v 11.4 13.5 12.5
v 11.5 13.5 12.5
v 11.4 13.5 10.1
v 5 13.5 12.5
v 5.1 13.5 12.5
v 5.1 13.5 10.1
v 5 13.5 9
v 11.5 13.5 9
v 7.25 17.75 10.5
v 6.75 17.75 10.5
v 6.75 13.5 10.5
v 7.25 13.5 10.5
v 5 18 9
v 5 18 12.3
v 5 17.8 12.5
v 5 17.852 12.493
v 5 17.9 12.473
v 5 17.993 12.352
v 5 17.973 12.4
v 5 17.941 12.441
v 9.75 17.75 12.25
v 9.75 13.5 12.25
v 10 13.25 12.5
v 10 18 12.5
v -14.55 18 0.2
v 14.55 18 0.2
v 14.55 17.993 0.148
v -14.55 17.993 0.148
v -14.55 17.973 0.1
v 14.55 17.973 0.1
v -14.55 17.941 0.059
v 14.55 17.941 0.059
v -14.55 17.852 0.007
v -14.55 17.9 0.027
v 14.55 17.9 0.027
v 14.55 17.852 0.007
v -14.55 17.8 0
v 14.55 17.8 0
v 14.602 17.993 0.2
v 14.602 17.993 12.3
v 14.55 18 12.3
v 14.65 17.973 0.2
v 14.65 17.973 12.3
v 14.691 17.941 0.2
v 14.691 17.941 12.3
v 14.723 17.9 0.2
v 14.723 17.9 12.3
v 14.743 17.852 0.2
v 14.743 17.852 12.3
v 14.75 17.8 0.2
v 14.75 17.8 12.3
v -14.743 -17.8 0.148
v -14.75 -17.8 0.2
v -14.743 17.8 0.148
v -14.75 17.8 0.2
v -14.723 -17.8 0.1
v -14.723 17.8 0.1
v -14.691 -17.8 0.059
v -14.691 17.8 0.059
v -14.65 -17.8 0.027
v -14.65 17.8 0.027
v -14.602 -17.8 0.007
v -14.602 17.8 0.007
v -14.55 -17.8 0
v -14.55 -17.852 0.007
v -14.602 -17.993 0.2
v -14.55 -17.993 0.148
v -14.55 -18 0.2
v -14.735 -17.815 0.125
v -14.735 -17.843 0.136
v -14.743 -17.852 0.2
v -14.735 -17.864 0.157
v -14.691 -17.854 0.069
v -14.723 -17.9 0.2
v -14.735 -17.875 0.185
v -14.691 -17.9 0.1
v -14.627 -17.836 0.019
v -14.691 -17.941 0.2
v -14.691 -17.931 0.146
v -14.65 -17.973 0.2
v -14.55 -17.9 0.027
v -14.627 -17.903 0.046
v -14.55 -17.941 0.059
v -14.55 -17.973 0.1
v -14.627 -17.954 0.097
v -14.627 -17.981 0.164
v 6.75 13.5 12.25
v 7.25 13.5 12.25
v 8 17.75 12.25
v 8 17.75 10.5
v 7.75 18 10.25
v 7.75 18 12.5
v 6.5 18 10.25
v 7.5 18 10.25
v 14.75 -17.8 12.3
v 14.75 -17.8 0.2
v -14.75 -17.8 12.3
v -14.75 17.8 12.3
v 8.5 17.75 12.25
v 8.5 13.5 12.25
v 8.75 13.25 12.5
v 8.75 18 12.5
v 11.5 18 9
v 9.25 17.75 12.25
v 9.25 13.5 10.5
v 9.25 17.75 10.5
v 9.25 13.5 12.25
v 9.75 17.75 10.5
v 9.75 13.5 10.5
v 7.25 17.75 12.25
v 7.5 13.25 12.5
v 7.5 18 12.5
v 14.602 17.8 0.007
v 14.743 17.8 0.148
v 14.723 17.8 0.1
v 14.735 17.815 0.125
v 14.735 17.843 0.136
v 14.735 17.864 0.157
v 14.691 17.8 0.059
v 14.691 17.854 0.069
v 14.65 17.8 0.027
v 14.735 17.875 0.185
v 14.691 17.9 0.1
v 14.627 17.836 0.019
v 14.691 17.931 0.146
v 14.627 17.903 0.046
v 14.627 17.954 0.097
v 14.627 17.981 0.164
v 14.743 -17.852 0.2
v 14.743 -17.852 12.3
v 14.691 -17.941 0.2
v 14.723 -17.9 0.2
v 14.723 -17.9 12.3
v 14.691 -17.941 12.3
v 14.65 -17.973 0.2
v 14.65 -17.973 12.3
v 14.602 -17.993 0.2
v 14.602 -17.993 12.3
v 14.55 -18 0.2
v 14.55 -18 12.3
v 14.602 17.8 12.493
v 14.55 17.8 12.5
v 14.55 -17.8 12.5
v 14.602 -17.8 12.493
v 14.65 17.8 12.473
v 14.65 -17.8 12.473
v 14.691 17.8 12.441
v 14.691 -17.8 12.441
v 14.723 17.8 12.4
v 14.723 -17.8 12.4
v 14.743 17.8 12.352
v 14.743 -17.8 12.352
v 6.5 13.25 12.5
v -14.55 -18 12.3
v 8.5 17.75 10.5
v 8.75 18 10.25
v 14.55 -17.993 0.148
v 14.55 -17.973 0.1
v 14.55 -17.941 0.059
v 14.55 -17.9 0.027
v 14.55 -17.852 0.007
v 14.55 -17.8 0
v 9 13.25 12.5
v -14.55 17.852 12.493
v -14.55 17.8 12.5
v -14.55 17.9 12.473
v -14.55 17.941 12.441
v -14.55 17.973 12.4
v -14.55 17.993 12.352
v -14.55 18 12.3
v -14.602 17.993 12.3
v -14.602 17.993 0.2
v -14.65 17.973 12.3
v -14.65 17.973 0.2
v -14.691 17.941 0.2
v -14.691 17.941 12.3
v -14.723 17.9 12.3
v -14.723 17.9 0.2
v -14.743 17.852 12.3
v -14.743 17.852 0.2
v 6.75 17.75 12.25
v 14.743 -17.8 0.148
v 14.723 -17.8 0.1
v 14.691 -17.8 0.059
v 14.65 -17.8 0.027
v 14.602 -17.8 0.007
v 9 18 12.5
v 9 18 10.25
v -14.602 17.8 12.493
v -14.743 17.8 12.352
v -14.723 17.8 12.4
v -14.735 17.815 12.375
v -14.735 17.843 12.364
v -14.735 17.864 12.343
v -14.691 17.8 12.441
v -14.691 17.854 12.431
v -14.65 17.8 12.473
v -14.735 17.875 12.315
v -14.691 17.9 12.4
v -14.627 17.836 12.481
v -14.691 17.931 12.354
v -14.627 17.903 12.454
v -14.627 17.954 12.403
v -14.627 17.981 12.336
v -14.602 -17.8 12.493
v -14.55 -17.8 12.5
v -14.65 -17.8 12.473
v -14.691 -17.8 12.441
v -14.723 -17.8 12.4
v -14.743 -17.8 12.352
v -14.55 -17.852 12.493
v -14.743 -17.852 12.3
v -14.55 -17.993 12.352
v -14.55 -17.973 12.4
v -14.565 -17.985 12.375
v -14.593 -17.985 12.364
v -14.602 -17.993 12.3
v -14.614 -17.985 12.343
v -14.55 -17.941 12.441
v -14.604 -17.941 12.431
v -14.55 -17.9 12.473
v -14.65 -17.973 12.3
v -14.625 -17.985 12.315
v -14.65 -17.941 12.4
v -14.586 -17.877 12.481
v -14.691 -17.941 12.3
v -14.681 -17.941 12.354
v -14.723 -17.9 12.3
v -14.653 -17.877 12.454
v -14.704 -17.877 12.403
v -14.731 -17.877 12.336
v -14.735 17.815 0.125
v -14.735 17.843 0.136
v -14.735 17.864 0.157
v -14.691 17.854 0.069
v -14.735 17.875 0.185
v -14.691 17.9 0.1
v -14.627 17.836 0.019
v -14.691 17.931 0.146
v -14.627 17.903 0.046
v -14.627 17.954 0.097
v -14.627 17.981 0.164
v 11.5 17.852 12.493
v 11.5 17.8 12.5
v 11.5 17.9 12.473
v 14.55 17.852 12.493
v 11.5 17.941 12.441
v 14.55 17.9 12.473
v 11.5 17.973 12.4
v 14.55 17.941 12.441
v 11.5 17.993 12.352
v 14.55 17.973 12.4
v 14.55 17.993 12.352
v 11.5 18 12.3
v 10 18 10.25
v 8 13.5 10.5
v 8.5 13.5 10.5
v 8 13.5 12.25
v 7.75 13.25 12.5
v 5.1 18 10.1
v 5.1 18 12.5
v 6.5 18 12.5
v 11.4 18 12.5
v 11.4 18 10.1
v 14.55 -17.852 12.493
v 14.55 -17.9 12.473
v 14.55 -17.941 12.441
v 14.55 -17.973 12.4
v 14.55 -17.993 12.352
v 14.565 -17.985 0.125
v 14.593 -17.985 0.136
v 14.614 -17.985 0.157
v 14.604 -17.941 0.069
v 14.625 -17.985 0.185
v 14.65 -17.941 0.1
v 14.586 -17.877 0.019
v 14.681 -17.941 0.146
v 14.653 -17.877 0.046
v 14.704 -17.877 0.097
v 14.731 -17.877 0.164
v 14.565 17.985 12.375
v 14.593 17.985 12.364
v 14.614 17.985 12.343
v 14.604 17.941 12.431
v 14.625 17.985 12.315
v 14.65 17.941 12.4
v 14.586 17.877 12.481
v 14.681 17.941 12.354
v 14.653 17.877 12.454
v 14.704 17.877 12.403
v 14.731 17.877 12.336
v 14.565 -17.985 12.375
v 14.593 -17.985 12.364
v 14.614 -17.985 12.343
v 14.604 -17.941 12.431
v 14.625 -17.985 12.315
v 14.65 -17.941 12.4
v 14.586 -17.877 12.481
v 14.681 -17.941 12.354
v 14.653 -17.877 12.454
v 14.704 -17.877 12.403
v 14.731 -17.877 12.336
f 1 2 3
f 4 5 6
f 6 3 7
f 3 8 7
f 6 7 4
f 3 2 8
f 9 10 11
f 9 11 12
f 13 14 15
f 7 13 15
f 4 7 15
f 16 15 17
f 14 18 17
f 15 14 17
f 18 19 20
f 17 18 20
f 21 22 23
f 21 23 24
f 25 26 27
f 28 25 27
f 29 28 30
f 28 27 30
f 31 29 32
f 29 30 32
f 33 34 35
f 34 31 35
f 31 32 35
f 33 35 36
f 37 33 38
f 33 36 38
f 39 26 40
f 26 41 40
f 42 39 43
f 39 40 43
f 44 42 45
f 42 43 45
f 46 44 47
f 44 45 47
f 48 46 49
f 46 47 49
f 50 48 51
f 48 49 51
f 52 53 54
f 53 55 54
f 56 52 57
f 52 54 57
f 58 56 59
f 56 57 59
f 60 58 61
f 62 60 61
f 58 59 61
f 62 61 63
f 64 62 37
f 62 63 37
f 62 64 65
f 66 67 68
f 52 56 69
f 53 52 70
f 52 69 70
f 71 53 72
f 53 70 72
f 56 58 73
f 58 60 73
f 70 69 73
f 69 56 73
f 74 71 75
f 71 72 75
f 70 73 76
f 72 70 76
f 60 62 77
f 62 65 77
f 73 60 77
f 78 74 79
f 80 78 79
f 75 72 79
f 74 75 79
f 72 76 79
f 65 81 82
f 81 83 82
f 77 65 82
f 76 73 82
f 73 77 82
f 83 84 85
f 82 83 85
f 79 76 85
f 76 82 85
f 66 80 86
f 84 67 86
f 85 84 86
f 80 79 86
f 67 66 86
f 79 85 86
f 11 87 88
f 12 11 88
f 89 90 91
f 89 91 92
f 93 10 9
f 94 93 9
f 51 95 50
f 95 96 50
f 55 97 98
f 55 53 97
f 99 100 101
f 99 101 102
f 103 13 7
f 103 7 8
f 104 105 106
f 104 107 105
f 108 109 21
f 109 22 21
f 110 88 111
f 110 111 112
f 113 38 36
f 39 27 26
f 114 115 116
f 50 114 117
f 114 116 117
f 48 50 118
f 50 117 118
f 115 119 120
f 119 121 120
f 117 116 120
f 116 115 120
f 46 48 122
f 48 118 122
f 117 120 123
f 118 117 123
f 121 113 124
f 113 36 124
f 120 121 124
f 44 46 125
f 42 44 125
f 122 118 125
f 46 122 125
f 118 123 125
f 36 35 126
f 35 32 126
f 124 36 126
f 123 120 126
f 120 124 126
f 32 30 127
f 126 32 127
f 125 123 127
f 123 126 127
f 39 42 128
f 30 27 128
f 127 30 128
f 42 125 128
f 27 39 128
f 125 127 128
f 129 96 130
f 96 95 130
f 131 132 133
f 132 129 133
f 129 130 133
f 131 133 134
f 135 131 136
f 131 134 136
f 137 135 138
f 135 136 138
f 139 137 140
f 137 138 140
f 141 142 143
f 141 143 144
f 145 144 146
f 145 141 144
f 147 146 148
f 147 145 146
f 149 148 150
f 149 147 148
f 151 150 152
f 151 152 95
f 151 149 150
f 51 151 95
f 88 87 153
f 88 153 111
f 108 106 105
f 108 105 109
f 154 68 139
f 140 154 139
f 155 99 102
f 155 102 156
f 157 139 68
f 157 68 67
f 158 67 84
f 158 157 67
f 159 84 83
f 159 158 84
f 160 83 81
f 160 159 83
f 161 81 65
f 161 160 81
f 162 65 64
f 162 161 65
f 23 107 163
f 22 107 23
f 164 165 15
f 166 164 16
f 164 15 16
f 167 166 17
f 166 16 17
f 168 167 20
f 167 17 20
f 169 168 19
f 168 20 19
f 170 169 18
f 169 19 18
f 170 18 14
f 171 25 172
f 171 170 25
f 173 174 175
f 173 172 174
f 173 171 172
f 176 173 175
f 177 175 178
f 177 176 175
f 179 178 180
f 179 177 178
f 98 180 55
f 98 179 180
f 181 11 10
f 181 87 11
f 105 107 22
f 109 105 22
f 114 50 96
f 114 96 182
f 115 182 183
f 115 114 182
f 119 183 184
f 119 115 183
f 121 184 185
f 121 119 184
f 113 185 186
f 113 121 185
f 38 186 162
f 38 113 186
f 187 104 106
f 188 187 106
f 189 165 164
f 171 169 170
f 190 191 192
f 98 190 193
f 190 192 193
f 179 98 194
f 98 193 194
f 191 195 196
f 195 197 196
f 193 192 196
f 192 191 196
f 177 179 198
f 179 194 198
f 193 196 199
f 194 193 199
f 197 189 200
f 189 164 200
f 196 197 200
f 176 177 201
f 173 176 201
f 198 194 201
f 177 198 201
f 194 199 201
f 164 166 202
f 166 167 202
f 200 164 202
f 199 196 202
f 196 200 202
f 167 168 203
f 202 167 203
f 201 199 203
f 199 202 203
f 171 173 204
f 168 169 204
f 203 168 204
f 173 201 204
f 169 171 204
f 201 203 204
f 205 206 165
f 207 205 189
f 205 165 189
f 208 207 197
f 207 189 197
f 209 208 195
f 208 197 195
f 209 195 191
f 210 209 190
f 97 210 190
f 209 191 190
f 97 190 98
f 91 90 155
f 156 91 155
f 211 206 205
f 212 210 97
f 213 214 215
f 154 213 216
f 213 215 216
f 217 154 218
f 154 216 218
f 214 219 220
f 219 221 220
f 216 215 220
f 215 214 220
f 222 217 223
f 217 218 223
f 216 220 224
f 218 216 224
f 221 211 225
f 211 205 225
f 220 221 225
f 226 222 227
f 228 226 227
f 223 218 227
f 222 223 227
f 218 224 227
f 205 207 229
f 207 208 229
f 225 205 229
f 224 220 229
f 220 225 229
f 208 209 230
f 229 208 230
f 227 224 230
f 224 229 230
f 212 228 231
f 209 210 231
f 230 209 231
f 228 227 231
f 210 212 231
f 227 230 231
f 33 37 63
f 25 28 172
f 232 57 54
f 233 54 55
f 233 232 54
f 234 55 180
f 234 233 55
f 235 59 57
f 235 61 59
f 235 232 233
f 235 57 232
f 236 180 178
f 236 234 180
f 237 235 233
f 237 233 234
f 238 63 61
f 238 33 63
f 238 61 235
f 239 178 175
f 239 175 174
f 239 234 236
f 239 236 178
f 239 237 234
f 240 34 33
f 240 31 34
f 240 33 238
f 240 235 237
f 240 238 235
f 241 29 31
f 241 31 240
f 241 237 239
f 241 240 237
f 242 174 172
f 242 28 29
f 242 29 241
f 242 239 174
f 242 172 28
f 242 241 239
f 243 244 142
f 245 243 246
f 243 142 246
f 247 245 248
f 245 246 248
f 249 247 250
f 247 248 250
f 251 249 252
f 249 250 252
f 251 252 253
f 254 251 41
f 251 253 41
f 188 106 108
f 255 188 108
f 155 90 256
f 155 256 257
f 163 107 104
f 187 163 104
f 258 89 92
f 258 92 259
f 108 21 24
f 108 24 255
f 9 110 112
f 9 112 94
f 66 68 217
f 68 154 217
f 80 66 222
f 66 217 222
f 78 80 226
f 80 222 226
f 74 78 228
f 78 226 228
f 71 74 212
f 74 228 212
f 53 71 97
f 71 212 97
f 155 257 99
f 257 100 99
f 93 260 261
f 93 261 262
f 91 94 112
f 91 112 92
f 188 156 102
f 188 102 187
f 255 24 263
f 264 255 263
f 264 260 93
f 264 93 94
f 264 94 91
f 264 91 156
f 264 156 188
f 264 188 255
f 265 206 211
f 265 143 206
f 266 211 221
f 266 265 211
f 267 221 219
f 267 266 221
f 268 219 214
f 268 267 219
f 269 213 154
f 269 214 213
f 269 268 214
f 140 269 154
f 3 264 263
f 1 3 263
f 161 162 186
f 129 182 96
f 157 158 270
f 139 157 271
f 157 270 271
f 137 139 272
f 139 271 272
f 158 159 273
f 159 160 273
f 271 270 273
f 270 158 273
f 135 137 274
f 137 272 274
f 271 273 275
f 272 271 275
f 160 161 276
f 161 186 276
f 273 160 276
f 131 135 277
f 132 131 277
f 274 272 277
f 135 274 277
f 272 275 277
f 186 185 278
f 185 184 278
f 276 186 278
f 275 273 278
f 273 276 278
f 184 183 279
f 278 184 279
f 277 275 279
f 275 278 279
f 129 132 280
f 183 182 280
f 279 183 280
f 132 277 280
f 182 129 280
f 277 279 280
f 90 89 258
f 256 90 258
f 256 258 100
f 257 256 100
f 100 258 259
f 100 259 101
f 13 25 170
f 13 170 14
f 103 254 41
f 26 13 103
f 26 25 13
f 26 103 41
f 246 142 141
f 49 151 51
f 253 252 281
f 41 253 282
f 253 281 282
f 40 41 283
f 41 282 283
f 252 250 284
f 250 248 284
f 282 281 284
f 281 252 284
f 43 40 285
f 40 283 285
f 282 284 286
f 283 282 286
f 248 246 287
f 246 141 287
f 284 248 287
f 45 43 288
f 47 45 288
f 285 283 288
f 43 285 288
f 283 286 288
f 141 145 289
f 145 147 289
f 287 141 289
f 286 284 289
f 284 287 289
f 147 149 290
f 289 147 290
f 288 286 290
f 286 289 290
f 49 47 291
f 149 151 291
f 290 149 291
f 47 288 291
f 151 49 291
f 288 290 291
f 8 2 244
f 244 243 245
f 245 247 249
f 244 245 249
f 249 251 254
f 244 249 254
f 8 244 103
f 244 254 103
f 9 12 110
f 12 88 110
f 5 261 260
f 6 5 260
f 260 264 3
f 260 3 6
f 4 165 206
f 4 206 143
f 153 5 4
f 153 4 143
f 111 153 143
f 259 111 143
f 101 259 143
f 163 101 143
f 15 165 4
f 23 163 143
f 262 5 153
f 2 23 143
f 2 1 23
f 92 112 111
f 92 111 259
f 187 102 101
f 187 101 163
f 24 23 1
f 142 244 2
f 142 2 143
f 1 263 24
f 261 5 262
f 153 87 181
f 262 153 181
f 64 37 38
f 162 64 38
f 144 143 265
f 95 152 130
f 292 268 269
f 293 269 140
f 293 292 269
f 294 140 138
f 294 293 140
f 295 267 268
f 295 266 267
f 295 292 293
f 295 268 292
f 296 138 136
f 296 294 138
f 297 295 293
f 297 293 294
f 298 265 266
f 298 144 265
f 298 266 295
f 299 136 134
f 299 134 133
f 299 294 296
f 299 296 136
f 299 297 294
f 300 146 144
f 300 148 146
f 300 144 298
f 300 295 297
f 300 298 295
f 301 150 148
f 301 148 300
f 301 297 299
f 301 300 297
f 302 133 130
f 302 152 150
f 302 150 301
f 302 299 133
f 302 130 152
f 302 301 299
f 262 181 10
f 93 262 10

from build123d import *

# Parameters (mm, degrees)
SKETCH1_W           = 29.5
SKETCH1_H           = 36
BOSS_EXTRUDE1_DEPTH = 12.5
SKETCH3_W           = 0.5
SKETCH3_H           = 5.122612704
SKETCH3_H_2         = 5.427477651
CUT_EXTRUDE1_DEPTH  = 2
CHAMFER1_SIZE       = 0.25
CUT_EXTRUDE2_DEPTH  = 4.5
FILLET1_R           = 0.2


with BuildPart() as part:
    # Sketch1 → Boss-Extrude1 (new body)
    with BuildSketch(Plane.XY):
        Rectangle(SKETCH1_W, SKETCH1_H)
    extrude(amount=BOSS_EXTRUDE1_DEPTH)

    # Sketch3 → Cut-Extrude1 (cut)
    with BuildSketch(Plane.XY.offset(12.5)):
        Polygon((8.5, 15.5), (8.5, 18.622612704), (8, 18.622612704), (8, 15.5), (8, 13.5), (8.5, 13.5), align=None)
        with Locations((9.5, 16.061306352)):
            Rectangle(SKETCH3_W, SKETCH3_H)
        with Locations((7, 16.213738826)):
            Rectangle(SKETCH3_W, SKETCH3_H_2)
    extrude(amount=-CUT_EXTRUDE1_DEPTH, mode=Mode.SUBTRACT)

    # Chamfer1
    chamfer1_edges = [part.edges().sort_by_distance(p)[0] for p in [
        (8, 15.75, 12.5),
        (8.25, 18, 10.5),
        (8.5, 15.75, 12.5),
        (8.25, 13.5, 12.5),
        (8.5, 18, 11.5),
        (8, 18, 11.5),
        (6.75, 15.75, 12.5),
        (9.25, 15.75, 12.5),
        (7, 18, 10.5),
        (9.5, 18, 10.5),
        (9.75, 15.75, 12.5),
        (9.5, 13.5, 12.5),
        (9.25, 18, 11.5),
        (9.75, 18, 11.5),
        (7.25, 15.75, 12.5),
        (7, 13.5, 12.5),
        (6.75, 18, 11.5),
        (7.25, 18, 11.5),
    ]]
    chamfer(chamfer1_edges, length=CHAMFER1_SIZE)

    # Sketch4 → Cut-Extrude2 (cut)
    with BuildSketch(Plane(origin=(0, 18, 0), x_dir=(1, 0, 0), z_dir=(0, 1, 0))):
        Polygon((5, -9), (11.5, -9), (11.5, -12.5), (11.5, -13.590293159), (11.4, -13.590293159), (11.4, -13.5), (11.4, -10.1), (5.1, -10.1), (5.1, -13.5), (5.1, -13.548678846), (5, -13.548678846), (5, -13.5), align=None)
    extrude(amount=-CUT_EXTRUDE2_DEPTH, mode=Mode.SUBTRACT)

    # Fillet1
    fillet1_edges = [part.edges().sort_by_distance(p)[0] for p in [
        (14.75, 0, 12.5),
        (-4.875, 18, 12.5),
        (13.125, 18, 12.5),
        (-14.75, 0, 12.5),
        (0, 18, 0),
        (14.75, 0, 0),
        (0, -18, 0),
        (-14.75, 0, 0),
        (0, -18, 12.5),
        (-14.75, 18, 6.25),
        (14.75, 18, 6.25),
        (14.75, -18, 6.25),
        (-14.75, -18, 6.25),
    ]]
    fillet(fillet1_edges, radius=FILLET1_R)


solid = part.part
